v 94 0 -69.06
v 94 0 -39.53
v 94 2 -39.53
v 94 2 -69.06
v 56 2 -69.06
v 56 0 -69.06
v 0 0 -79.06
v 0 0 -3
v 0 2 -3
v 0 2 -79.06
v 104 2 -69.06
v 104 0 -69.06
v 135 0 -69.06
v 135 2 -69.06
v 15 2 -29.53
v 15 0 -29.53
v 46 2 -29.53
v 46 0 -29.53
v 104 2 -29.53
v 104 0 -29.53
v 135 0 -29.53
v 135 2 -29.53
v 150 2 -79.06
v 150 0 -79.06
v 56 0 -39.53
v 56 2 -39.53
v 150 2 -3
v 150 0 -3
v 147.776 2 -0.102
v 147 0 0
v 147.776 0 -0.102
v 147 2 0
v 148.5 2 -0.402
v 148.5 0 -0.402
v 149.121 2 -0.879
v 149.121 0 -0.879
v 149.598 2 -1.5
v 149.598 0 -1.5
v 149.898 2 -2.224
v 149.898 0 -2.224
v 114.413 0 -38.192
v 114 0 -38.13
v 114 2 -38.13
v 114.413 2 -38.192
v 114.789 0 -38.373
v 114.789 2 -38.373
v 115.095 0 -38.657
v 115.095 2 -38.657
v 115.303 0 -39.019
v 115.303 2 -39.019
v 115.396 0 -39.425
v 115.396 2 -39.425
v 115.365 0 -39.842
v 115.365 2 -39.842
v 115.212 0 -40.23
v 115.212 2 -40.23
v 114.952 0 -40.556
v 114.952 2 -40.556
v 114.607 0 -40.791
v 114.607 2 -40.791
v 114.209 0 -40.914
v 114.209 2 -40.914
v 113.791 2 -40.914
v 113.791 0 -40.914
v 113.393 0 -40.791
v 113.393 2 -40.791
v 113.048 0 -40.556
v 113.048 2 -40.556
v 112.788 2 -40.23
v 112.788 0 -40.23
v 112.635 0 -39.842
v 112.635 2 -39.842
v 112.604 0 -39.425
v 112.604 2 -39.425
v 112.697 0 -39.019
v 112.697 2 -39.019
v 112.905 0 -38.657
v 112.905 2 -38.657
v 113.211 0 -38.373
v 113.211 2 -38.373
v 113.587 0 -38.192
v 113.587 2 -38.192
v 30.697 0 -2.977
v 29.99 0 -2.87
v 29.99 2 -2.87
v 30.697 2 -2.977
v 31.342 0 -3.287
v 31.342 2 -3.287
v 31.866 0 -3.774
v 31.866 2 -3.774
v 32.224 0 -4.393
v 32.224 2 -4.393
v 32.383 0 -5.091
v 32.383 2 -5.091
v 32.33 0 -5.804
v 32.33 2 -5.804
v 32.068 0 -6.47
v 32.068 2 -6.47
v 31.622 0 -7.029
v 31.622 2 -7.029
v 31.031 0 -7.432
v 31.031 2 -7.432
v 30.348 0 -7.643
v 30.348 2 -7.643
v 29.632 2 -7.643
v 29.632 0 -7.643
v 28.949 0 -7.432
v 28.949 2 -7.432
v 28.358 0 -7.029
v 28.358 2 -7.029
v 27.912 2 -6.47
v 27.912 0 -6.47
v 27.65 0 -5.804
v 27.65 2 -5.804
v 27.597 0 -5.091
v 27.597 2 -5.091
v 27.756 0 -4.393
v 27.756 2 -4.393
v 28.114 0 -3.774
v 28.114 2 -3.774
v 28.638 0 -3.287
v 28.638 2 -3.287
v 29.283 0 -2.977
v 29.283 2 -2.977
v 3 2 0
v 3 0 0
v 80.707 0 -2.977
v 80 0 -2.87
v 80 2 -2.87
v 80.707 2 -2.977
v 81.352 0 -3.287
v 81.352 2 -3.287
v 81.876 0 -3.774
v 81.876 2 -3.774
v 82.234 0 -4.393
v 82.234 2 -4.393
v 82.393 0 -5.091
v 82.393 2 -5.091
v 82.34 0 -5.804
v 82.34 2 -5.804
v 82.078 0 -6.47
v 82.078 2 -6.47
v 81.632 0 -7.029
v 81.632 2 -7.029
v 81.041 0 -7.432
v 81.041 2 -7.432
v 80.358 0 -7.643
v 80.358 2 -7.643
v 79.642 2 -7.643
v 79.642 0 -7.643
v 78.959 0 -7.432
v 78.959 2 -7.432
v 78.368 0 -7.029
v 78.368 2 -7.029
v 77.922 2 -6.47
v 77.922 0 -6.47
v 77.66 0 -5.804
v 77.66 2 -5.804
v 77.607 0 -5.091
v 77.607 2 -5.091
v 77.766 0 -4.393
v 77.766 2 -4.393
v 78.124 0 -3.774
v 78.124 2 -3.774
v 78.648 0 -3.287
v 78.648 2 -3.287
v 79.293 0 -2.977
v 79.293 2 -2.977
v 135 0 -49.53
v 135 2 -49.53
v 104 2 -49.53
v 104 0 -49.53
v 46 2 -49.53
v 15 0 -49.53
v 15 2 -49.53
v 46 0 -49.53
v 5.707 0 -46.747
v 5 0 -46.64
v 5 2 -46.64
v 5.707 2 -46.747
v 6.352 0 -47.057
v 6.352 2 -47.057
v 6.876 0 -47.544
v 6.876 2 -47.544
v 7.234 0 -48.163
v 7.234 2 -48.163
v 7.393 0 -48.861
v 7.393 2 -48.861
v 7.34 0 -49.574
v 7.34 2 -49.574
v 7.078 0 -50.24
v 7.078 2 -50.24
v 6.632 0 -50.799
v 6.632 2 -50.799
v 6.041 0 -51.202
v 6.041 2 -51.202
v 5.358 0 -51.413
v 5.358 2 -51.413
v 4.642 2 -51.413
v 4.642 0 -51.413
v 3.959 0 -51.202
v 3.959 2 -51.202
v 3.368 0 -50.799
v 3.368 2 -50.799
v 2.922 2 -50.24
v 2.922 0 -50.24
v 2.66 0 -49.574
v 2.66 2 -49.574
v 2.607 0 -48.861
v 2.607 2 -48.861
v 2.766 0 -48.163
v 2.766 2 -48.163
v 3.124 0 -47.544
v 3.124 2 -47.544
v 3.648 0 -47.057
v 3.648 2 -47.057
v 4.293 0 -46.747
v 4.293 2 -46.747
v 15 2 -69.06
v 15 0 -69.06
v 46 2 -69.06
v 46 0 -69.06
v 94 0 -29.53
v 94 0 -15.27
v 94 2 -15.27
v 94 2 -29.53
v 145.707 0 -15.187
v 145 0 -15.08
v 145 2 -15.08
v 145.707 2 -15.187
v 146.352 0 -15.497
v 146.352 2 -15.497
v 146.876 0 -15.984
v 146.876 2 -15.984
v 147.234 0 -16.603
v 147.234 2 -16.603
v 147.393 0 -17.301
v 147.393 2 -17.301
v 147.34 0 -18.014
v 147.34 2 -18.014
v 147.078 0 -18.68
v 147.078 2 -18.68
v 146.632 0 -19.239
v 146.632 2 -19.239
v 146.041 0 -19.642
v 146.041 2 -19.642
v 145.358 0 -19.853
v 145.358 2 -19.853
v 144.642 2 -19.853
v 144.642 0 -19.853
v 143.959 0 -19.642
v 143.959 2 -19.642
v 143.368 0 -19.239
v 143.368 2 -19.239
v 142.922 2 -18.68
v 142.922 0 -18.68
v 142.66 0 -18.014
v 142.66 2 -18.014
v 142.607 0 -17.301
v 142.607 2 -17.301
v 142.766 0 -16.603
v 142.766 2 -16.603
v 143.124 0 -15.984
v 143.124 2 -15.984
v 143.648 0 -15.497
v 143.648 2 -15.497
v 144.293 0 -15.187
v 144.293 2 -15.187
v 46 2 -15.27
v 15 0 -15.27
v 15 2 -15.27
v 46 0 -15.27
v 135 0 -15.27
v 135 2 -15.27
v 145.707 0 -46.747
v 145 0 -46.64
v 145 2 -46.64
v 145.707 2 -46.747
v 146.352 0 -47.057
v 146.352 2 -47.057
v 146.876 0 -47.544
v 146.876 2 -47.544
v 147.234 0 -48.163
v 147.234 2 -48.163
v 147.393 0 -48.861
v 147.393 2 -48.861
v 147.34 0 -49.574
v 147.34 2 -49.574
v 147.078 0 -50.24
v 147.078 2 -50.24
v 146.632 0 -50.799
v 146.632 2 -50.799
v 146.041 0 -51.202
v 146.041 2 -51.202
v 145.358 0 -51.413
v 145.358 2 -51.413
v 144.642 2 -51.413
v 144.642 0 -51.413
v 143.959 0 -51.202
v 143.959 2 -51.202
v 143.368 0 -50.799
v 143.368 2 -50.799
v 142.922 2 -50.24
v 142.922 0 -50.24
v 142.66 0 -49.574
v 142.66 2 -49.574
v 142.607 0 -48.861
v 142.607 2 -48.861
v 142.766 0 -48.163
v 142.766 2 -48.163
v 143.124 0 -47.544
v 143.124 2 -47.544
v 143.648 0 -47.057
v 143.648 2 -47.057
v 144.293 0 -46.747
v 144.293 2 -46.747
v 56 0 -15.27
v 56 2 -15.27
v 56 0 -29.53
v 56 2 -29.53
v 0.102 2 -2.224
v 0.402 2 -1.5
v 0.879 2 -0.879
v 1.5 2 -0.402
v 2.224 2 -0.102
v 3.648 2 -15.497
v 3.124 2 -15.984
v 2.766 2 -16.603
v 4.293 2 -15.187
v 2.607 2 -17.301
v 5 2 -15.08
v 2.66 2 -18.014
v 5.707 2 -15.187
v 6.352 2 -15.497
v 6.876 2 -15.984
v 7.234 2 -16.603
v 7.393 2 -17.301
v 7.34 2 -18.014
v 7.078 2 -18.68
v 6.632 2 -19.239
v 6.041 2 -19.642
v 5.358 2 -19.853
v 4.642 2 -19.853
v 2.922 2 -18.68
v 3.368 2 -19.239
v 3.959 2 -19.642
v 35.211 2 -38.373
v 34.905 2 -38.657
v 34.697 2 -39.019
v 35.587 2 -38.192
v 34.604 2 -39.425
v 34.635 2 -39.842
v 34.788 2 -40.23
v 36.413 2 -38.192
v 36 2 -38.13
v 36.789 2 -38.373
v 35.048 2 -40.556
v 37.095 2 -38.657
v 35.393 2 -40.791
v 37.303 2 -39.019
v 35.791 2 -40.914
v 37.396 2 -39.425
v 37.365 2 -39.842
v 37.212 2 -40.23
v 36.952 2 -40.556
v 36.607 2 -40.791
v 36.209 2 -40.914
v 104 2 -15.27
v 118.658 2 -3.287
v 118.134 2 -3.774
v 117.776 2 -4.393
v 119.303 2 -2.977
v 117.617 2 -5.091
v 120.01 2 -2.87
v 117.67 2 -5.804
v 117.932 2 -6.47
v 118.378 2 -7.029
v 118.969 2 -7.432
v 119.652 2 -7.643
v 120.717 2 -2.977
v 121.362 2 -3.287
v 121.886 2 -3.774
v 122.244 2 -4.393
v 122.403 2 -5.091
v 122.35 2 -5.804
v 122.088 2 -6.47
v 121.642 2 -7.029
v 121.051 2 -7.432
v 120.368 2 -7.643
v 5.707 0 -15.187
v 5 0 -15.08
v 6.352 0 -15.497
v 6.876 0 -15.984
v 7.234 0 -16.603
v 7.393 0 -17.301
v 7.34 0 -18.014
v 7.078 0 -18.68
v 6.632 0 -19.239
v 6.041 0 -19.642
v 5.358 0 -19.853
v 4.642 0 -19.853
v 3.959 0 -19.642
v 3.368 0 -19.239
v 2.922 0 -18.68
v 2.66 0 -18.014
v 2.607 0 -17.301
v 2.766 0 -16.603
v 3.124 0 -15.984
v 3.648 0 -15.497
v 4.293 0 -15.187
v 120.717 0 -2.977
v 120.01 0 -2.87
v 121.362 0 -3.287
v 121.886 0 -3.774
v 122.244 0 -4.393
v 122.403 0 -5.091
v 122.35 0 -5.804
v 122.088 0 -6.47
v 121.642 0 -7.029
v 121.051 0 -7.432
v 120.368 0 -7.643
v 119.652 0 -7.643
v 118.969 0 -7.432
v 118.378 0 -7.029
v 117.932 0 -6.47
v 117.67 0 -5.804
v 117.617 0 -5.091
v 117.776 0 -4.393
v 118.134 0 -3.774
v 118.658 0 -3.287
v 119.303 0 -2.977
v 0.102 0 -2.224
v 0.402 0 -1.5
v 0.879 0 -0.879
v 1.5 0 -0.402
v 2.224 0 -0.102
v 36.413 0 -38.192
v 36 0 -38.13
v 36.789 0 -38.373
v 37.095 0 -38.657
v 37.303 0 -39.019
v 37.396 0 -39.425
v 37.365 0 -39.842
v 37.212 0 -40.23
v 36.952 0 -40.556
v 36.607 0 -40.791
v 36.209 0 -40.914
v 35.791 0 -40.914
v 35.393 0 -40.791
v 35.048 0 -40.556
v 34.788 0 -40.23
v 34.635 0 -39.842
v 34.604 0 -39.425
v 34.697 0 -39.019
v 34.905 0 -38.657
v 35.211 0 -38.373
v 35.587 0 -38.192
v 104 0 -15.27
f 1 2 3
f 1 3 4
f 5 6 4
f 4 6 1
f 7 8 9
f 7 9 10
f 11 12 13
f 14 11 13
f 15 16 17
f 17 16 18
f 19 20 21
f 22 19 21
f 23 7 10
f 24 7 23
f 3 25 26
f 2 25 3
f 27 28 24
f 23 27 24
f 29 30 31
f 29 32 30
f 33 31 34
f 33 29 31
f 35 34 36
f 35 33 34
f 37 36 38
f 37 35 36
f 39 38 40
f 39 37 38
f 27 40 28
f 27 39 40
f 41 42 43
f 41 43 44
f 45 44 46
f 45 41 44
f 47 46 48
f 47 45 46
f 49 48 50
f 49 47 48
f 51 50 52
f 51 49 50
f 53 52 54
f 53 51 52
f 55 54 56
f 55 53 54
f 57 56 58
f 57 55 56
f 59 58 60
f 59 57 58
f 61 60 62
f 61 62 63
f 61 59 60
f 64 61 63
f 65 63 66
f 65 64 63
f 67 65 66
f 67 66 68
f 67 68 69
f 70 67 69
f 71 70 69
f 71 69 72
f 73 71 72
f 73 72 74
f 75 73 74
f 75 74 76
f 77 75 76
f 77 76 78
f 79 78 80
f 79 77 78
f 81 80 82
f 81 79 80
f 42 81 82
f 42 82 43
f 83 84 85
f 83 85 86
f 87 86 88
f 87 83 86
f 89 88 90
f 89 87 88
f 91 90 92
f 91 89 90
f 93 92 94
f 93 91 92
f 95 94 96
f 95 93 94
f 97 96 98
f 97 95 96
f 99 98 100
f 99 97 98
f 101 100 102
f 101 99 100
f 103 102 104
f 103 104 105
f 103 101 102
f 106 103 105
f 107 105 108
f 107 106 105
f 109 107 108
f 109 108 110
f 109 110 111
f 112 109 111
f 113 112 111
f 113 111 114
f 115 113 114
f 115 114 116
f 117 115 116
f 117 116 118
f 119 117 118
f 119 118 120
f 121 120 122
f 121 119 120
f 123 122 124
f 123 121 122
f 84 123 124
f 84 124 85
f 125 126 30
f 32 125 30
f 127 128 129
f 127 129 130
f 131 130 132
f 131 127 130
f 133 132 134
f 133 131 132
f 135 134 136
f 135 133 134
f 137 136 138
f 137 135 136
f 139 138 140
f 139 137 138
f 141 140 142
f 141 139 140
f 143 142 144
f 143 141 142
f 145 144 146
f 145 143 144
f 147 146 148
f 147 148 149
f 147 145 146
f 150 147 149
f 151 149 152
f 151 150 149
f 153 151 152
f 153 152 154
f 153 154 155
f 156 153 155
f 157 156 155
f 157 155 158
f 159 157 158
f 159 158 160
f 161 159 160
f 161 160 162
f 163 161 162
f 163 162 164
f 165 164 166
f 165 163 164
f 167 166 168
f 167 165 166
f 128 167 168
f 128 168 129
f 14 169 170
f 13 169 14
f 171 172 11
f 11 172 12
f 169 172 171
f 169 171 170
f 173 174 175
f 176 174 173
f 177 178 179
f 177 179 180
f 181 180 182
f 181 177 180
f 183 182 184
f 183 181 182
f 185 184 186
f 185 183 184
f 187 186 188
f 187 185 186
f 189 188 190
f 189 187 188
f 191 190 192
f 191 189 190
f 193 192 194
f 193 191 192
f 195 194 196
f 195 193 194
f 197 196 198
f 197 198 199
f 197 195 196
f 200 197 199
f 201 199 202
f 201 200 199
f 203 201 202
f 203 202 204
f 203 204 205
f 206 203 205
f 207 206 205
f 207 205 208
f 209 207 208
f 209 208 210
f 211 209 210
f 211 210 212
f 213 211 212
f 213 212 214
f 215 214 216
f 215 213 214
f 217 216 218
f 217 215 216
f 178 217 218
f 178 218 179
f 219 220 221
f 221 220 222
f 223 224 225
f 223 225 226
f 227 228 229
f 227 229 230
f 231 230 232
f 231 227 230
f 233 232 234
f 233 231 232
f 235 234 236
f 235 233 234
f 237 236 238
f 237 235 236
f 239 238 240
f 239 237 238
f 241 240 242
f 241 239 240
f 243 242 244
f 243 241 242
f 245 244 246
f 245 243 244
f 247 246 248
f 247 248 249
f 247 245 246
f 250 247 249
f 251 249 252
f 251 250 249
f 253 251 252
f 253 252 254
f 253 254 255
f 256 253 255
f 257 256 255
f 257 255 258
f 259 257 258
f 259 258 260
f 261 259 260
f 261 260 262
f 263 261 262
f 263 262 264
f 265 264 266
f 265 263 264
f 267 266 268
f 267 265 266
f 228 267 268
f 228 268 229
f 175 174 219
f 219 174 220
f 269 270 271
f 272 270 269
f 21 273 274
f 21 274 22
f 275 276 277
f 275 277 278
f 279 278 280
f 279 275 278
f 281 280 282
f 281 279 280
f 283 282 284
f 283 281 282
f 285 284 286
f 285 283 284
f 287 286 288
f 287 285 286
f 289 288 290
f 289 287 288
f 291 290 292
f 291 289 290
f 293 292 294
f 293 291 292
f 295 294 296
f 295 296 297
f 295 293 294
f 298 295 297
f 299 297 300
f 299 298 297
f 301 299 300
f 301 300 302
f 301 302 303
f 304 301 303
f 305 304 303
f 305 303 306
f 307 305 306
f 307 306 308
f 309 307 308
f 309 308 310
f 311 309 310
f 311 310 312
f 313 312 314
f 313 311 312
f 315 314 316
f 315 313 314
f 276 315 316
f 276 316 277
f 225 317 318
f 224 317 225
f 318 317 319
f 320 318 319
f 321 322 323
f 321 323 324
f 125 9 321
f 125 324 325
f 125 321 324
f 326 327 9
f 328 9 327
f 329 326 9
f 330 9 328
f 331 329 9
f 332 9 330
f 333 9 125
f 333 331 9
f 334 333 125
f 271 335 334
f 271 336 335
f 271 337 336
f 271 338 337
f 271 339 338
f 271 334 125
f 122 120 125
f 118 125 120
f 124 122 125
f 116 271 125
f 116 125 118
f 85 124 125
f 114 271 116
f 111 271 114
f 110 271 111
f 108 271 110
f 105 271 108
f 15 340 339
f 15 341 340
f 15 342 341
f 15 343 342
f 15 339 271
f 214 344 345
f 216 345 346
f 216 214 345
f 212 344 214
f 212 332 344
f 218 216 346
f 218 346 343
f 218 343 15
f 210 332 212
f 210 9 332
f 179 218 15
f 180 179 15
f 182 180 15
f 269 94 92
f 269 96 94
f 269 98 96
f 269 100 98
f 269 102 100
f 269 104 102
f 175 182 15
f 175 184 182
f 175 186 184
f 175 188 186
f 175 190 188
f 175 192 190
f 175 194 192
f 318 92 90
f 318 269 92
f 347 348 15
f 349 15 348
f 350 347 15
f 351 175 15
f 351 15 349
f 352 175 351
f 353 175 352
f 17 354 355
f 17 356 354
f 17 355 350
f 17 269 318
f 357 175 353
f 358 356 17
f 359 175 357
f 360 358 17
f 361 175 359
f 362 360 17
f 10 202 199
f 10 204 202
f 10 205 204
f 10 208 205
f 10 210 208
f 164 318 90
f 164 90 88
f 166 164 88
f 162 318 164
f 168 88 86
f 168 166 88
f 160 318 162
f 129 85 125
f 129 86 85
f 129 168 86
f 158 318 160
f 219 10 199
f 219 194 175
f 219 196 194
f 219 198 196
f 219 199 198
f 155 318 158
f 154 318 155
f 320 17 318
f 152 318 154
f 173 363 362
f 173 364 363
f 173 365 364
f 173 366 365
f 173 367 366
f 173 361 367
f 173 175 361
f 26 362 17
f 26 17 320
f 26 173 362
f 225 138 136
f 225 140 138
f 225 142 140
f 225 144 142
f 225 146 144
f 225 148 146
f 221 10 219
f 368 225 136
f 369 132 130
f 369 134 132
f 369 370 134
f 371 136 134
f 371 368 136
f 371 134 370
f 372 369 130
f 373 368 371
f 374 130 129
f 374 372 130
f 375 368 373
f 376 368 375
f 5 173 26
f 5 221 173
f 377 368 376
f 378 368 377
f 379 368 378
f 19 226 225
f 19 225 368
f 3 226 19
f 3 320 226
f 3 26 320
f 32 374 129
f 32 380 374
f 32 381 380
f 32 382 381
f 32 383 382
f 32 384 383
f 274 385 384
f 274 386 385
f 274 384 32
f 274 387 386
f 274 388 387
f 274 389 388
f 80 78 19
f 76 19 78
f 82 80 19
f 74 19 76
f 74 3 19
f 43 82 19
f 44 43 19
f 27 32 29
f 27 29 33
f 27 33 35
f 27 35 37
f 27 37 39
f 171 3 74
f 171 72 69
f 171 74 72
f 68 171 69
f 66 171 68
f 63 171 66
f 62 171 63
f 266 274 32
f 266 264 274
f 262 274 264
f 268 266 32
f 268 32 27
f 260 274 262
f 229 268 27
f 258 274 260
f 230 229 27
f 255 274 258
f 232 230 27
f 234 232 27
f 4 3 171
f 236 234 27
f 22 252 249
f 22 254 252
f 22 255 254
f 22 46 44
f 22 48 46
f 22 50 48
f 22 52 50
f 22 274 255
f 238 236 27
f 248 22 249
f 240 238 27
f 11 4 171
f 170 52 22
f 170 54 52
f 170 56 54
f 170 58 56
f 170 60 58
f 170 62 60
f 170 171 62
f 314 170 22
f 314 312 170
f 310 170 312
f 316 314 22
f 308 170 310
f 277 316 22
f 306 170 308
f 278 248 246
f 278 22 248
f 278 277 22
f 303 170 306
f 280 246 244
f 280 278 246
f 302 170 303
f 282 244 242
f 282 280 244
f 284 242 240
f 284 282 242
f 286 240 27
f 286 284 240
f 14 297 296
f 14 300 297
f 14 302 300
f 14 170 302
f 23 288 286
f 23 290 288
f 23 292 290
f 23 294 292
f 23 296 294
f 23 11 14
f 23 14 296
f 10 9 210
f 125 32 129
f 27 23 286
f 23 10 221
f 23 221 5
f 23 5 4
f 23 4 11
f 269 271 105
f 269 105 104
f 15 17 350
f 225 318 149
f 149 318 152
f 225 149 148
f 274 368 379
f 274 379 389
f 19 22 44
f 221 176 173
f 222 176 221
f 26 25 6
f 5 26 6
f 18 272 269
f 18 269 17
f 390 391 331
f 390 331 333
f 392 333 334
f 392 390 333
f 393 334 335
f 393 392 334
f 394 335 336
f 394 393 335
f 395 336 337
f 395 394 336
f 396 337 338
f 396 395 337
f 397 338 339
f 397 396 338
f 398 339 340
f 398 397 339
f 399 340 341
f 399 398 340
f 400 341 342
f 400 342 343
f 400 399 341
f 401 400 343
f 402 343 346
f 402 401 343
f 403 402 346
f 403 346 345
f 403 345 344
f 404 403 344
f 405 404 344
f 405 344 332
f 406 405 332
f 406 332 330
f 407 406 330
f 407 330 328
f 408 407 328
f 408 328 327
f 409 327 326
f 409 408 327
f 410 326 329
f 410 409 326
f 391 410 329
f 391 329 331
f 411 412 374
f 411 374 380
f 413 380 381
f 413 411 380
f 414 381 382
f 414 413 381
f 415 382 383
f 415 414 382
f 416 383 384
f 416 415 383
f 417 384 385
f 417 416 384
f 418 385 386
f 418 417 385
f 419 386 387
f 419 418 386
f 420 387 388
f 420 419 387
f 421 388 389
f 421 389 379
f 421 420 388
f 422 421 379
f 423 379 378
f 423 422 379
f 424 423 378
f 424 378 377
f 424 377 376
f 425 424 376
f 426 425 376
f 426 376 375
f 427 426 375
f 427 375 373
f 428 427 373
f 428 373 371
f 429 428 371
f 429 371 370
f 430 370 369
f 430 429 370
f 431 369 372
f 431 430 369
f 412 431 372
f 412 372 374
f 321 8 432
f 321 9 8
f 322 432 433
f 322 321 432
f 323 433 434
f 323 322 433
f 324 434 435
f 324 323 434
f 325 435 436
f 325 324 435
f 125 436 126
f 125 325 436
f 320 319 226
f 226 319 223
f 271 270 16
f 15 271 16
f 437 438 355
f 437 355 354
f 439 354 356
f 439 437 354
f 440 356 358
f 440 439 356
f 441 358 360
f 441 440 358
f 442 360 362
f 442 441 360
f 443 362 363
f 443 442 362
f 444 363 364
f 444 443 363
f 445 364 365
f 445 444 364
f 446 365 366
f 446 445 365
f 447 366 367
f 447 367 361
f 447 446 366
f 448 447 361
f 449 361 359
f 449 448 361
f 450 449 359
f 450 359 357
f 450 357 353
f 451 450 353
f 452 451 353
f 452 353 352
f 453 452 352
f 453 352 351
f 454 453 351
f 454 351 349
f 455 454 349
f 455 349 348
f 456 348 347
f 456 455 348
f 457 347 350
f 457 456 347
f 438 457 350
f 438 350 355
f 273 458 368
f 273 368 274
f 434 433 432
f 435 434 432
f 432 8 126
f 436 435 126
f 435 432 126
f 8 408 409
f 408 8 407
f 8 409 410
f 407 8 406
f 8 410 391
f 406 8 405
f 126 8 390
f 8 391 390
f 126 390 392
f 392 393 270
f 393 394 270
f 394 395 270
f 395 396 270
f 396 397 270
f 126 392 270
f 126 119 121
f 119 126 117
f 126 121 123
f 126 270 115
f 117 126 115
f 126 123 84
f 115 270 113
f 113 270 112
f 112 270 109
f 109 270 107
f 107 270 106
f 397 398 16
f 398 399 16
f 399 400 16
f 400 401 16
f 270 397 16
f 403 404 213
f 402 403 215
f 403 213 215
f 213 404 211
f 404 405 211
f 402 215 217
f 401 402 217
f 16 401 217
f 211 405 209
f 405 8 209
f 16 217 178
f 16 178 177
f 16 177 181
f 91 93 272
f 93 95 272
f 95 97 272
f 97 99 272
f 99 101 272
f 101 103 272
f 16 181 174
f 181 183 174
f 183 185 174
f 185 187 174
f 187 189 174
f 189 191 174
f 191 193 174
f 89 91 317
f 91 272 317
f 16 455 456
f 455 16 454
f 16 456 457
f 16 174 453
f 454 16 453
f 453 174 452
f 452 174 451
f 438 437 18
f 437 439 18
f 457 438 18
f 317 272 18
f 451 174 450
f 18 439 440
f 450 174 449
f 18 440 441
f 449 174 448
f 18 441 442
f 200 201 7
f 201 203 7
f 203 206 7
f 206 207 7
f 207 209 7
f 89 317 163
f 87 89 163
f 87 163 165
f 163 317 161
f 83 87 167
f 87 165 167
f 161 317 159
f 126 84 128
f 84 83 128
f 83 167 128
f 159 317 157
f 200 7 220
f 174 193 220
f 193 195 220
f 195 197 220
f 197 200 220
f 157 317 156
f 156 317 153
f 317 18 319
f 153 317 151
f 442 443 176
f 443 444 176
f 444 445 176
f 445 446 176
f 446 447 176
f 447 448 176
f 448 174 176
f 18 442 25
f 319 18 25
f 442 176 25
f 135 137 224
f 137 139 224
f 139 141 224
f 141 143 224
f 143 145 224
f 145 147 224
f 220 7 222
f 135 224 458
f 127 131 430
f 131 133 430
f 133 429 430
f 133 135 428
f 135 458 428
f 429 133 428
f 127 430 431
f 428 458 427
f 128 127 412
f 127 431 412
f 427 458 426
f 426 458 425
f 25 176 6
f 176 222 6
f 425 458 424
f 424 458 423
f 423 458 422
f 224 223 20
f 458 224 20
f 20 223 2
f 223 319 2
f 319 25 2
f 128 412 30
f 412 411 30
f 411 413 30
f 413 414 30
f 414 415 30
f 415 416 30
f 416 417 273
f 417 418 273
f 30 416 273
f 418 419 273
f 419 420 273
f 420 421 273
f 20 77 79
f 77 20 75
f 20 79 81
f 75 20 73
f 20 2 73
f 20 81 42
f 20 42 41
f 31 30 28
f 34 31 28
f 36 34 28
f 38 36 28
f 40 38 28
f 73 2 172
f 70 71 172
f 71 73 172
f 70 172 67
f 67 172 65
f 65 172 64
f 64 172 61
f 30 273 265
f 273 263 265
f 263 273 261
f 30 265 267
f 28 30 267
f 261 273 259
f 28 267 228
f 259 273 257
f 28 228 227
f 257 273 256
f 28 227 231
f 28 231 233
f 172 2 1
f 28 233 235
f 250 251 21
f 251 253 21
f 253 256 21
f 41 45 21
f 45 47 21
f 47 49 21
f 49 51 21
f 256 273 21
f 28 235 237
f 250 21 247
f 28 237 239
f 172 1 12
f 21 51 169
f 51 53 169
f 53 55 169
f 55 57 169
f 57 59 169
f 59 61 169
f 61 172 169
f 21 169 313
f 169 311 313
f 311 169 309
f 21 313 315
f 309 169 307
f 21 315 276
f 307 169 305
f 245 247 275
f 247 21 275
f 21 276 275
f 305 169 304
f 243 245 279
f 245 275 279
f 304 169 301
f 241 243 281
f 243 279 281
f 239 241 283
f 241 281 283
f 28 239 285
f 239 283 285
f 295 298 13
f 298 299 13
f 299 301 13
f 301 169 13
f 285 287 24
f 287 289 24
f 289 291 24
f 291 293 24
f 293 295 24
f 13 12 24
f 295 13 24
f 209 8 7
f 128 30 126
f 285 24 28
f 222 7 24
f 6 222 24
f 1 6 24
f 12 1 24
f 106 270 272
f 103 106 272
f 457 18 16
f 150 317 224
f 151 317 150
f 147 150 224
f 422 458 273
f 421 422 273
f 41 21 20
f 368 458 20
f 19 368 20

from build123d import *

# Parameters (mm, degrees)
ESQUISSE1_W        = 150
ESQUISSE1_H        = 79.06
ESQUISSE1_R        = 2.4
ESQUISSE1_R_2      = 1.4
ESQUISSE1_W_2      = 31
ESQUISSE1_H_2      = 19.53
ESQUISSE1_W_3      = 38
ESQUISSE1_H_3      = 29.53
ESQUISSE1_H_4      = 14.26
BOSS_EXTRU_1_DEPTH = 2
CONG_1_R           = 3


with BuildPart() as part:
    # Esquisse1 → Boss.-Extru.1 (new body)
    with BuildSketch(Plane(origin=(0, 0, 0), x_dir=(1, 0, 0), z_dir=(0, 1, 0))):
        with Locations((75, 39.53)):
            Rectangle(ESQUISSE1_W, ESQUISSE1_H)
        with Locations(Location((5, 49.04, 0), (0, 0, 270))):
            Circle(ESQUISSE1_R, mode=Mode.SUBTRACT)
        with Locations(Location((5, 17.48, 0), (0, 0, 270))):
            Circle(ESQUISSE1_R, mode=Mode.SUBTRACT)
        with Locations(Location((29.99, 5.27, 0), (0, 0, 270))):
            Circle(ESQUISSE1_R, mode=Mode.SUBTRACT)
        with Locations(Location((80, 5.27, 0), (0, 0, 270))):
            Circle(ESQUISSE1_R, mode=Mode.SUBTRACT)
        with Locations(Location((120.01, 5.27, 0), (0, 0, 270))):
            Circle(ESQUISSE1_R, mode=Mode.SUBTRACT)
        with Locations(Location((145, 49.04, 0), (0, 0, 270))):
            Circle(ESQUISSE1_R, mode=Mode.SUBTRACT)
        with Locations(Location((145, 17.48, 0), (0, 0, 270))):
            Circle(ESQUISSE1_R, mode=Mode.SUBTRACT)
        with Locations(Location((36, 39.53, 0), (0, 0, 270))):
            Circle(ESQUISSE1_R_2, mode=Mode.SUBTRACT)
        with Locations(Location((114, 39.53, 0), (0, 0, 270))):
            Circle(ESQUISSE1_R_2, mode=Mode.SUBTRACT)
        with Locations((30.5, 59.295)):
            Rectangle(ESQUISSE1_W_2, ESQUISSE1_H_2, mode=Mode.SUBTRACT)
        with Locations((75, 54.295)):
            Rectangle(ESQUISSE1_W_3, ESQUISSE1_H_3, mode=Mode.SUBTRACT)
        with Locations((119.5, 59.295)):
            Rectangle(ESQUISSE1_W_2, ESQUISSE1_H_2, mode=Mode.SUBTRACT)
        with Locations((119.5, 22.4)):
            Rectangle(ESQUISSE1_W_2, ESQUISSE1_H_4, mode=Mode.SUBTRACT)
        with Locations((75, 22.4)):
            Rectangle(ESQUISSE1_W_3, ESQUISSE1_H_4, mode=Mode.SUBTRACT)
        with Locations((30.5, 22.4)):
            Rectangle(ESQUISSE1_W_2, ESQUISSE1_H_4, mode=Mode.SUBTRACT)
    extrude(amount=BOSS_EXTRU_1_DEPTH)

    # Congé1
    cong_1_edges = [part.edges().sort_by_distance(p)[0] for p in [
        (150, 1, 0),
        (0, 1, 0),
    ]]
    fillet(cong_1_edges, radius=CONG_1_R)


solid = part.part
